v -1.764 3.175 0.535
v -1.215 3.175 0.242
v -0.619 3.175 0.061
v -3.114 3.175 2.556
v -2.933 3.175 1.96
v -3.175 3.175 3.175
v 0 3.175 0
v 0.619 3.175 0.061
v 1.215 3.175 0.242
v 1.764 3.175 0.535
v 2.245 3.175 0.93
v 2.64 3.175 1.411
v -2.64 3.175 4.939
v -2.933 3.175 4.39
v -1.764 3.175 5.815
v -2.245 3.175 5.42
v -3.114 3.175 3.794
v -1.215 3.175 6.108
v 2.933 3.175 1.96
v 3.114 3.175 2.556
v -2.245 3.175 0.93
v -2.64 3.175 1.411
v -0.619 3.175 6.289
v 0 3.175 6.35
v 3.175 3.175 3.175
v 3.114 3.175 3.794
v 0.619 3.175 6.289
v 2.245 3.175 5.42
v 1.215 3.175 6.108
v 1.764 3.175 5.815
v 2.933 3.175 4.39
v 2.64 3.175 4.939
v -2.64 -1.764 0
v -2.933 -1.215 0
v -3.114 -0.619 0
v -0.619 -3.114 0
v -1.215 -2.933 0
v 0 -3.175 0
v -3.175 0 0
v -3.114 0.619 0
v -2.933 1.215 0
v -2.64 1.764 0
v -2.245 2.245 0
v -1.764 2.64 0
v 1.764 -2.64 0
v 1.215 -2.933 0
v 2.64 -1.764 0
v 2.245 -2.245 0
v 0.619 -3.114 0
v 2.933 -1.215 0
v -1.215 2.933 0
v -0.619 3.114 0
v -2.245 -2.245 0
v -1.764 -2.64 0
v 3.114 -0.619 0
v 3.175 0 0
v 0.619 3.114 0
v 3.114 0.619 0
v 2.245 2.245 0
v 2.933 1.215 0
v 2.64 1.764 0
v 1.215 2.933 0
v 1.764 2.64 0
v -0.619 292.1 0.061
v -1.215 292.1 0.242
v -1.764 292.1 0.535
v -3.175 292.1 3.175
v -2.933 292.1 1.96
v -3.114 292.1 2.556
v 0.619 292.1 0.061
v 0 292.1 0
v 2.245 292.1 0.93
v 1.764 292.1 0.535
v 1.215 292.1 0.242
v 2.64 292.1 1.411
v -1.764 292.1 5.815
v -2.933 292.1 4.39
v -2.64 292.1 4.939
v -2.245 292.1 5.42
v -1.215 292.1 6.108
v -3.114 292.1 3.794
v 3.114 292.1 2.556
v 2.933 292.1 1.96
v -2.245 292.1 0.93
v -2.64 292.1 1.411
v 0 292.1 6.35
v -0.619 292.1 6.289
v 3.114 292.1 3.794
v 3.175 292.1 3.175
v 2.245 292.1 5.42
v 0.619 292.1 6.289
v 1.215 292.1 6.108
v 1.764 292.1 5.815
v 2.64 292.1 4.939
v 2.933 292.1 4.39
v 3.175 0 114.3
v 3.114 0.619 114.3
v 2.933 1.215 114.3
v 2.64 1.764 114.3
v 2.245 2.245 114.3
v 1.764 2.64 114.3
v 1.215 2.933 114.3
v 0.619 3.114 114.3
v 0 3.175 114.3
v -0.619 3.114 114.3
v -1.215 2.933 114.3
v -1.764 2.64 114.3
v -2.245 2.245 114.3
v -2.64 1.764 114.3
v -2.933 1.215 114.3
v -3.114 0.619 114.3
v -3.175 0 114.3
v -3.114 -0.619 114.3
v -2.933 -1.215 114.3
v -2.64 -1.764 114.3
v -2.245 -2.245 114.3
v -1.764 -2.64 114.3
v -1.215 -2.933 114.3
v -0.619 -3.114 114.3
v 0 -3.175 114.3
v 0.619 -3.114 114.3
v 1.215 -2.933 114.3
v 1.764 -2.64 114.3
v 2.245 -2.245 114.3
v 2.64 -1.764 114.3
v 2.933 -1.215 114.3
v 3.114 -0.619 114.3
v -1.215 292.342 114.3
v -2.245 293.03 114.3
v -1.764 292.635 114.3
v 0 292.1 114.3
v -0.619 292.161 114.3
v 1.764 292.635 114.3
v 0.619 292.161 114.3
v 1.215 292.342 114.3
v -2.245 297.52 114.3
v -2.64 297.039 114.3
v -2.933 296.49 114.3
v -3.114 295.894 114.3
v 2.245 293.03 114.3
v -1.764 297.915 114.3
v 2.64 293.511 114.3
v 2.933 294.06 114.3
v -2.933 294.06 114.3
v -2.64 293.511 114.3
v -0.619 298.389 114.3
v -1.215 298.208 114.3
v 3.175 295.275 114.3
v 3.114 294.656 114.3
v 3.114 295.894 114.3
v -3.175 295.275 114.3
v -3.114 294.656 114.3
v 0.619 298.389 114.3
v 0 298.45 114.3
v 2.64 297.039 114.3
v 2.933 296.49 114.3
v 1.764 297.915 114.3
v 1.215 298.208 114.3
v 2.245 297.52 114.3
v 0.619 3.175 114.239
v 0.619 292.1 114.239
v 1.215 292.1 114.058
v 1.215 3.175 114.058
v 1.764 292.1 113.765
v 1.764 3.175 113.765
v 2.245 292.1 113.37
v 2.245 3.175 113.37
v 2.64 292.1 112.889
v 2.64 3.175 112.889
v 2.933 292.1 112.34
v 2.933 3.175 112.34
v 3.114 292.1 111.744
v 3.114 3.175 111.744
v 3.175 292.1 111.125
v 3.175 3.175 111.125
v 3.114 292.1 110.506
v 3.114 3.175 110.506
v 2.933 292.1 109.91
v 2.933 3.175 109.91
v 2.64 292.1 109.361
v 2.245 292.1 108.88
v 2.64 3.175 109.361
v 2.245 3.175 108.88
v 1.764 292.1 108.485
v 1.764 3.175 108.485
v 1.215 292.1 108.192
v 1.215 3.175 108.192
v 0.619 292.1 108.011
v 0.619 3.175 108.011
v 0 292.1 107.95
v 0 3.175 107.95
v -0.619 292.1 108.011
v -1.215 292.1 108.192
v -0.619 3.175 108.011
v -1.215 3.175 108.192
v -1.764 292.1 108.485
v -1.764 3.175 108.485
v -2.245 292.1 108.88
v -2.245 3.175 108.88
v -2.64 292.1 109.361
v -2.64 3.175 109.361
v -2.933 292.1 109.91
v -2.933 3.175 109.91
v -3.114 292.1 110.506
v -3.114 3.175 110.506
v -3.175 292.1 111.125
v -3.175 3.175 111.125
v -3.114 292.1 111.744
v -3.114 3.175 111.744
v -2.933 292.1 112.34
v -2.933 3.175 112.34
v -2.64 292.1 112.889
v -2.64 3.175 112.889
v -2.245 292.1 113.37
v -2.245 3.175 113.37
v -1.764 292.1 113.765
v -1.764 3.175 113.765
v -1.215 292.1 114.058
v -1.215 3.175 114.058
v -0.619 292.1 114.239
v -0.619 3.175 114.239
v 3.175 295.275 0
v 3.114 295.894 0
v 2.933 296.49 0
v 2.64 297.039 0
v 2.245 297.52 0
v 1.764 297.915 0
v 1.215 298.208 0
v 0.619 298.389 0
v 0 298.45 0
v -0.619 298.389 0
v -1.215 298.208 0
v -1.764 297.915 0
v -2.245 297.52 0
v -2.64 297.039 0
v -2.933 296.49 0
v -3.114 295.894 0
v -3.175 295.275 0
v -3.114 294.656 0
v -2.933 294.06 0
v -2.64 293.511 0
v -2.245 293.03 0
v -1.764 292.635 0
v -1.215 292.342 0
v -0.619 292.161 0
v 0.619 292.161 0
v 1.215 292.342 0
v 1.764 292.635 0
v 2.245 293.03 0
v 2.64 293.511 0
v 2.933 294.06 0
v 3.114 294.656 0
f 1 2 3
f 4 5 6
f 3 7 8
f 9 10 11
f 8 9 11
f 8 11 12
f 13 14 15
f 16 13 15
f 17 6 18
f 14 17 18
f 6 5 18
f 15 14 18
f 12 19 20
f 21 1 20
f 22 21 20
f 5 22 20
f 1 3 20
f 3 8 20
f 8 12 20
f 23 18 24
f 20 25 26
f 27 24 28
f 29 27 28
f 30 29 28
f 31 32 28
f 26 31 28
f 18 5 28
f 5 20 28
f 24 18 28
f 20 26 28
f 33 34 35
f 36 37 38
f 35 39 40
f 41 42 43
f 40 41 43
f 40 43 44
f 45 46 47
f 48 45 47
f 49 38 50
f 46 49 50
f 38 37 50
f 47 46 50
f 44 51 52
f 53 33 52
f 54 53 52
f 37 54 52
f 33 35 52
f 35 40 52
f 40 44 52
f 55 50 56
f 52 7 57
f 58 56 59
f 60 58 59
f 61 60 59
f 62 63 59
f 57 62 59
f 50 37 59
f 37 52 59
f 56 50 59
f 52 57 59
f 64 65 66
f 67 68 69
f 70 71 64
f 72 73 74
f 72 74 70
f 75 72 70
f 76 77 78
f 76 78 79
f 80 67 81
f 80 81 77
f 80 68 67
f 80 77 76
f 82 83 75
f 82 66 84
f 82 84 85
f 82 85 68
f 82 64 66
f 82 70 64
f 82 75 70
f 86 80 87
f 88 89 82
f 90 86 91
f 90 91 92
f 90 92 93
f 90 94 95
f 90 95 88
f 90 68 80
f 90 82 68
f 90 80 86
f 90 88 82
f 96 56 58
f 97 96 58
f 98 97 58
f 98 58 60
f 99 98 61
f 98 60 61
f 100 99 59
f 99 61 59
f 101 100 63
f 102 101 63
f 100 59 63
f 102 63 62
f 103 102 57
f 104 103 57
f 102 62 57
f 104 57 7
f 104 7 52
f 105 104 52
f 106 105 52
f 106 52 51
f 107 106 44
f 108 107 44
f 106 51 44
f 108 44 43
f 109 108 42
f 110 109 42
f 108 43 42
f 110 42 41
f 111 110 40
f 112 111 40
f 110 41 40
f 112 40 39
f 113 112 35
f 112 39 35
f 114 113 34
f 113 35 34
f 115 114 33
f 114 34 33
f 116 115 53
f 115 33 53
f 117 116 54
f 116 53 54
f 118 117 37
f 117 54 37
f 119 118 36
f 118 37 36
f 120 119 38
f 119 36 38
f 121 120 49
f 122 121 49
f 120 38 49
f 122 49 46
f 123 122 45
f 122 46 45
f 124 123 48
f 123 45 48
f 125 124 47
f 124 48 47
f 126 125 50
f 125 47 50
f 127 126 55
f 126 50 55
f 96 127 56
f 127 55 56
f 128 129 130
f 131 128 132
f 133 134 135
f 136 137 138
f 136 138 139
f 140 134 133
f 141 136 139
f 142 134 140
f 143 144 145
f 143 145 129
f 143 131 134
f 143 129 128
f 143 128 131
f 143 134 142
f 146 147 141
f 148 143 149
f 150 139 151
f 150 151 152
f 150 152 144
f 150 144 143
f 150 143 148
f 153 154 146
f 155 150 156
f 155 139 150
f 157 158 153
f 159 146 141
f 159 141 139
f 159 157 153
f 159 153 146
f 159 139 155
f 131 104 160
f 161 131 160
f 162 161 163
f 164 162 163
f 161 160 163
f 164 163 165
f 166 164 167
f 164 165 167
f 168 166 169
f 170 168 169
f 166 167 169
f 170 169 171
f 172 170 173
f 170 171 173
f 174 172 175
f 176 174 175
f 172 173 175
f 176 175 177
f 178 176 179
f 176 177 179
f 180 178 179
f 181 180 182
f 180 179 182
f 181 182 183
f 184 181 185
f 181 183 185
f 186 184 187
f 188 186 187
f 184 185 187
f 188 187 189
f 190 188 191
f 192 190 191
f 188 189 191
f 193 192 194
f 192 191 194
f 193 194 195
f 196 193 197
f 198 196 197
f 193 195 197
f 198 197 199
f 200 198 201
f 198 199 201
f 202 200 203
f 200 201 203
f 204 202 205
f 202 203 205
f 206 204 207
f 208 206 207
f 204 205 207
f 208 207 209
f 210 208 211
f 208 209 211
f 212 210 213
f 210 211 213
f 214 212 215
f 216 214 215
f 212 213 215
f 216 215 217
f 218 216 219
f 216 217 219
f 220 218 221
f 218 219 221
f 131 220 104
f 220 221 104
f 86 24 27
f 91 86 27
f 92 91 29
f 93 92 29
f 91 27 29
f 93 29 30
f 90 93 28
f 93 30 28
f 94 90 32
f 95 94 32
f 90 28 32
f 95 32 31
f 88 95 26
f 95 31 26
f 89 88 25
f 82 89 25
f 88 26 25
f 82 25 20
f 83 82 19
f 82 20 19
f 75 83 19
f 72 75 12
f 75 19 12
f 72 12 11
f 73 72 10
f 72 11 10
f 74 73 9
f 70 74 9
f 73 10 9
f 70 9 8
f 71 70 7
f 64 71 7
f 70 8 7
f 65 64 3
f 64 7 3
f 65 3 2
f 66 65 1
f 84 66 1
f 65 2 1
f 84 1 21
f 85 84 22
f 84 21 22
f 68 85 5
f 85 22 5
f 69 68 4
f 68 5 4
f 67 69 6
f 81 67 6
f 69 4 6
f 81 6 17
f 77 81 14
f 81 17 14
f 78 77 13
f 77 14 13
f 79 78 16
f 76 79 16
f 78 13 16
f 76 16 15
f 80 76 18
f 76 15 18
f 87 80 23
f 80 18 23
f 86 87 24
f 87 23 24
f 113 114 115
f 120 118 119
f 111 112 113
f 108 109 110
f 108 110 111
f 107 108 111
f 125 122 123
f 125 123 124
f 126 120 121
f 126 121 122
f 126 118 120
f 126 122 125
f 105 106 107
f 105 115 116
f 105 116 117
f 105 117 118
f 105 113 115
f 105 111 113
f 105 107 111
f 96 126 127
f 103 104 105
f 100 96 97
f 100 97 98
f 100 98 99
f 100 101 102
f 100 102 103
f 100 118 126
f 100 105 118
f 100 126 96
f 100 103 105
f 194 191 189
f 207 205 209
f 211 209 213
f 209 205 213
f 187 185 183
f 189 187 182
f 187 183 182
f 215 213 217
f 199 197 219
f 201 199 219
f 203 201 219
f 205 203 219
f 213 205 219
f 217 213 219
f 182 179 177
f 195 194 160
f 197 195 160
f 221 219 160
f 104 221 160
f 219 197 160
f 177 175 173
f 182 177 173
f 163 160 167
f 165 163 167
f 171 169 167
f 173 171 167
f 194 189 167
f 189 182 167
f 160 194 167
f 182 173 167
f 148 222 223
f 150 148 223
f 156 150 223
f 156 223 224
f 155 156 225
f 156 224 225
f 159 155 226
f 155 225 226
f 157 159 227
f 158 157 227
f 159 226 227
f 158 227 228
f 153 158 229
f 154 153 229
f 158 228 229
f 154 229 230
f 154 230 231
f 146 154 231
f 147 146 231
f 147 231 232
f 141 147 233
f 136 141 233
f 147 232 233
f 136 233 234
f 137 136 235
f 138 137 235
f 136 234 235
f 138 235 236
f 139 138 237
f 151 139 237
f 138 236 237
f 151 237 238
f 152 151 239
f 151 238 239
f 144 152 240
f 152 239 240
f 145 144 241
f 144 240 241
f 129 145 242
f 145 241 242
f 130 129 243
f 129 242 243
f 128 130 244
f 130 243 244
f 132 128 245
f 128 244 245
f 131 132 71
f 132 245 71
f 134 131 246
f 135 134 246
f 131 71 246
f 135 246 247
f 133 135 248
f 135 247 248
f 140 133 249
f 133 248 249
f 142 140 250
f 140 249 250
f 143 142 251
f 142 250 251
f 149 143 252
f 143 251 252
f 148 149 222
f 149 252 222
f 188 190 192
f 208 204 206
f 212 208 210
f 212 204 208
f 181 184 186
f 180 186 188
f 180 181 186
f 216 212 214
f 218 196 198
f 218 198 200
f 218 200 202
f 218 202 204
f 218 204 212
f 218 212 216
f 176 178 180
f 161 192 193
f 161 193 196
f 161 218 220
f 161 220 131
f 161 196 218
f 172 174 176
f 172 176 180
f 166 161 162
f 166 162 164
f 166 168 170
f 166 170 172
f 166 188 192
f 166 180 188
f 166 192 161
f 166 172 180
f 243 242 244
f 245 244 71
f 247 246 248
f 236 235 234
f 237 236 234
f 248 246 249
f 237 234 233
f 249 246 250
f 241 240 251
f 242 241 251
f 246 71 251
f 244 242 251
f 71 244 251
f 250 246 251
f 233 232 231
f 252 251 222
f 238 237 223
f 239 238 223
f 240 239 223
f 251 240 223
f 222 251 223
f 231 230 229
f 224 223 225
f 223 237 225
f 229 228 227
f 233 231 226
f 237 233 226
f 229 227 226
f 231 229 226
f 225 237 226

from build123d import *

# Parameters (mm, degrees)
SKETCH1_R           = 3.175
BOSS_EXTRUDE1_DEPTH = 114.3
SKETCH3_R           = 3.175
BOSS_EXTRUDE3_DEPTH = 288.925
SKETCH4_R           = 3.175
BOSS_EXTRUDE4_DEPTH = 288.925
SKETCH5_R           = 3.175
BOSS_EXTRUDE5_DEPTH = 114.3


with BuildPart() as part:
    # Sketch1 → Boss-Extrude1 (new body)
    with BuildSketch(Plane.XY):
        Circle(SKETCH1_R)
    extrude(amount=BOSS_EXTRUDE1_DEPTH)


with BuildPart() as body_2:
    # Sketch3 → Boss-Extrude3 (new body)
    with BuildSketch(Plane(origin=(0, 3.175, 0), x_dir=(1, 0, 0), z_dir=(0, 1, 0))):
        with Locations(Location((0, -111.125, 0), (0, 0, 270))):
            Circle(SKETCH3_R)
    extrude(amount=BOSS_EXTRUDE3_DEPTH)


with BuildPart() as body_3:
    # Sketch4 → Boss-Extrude4 (new body)
    with BuildSketch(Plane(origin=(0, 3.175, 0), x_dir=(1, 0, 0), z_dir=(0, 1, 0))):
        with Locations(Location((0, -3.175, 0), (0, 0, 270))):
            Circle(SKETCH4_R)
    extrude(amount=BOSS_EXTRUDE4_DEPTH)


with BuildPart() as body_4:
    # Sketch5 → Boss-Extrude5 (new body)
    with BuildSketch(Plane.XY):
        with Locations((0, 295.275)):
            Circle(SKETCH5_R)
    extrude(amount=BOSS_EXTRUDE5_DEPTH)


solid = Compound([part.part, body_2.part, body_3.part, body_4.part])
